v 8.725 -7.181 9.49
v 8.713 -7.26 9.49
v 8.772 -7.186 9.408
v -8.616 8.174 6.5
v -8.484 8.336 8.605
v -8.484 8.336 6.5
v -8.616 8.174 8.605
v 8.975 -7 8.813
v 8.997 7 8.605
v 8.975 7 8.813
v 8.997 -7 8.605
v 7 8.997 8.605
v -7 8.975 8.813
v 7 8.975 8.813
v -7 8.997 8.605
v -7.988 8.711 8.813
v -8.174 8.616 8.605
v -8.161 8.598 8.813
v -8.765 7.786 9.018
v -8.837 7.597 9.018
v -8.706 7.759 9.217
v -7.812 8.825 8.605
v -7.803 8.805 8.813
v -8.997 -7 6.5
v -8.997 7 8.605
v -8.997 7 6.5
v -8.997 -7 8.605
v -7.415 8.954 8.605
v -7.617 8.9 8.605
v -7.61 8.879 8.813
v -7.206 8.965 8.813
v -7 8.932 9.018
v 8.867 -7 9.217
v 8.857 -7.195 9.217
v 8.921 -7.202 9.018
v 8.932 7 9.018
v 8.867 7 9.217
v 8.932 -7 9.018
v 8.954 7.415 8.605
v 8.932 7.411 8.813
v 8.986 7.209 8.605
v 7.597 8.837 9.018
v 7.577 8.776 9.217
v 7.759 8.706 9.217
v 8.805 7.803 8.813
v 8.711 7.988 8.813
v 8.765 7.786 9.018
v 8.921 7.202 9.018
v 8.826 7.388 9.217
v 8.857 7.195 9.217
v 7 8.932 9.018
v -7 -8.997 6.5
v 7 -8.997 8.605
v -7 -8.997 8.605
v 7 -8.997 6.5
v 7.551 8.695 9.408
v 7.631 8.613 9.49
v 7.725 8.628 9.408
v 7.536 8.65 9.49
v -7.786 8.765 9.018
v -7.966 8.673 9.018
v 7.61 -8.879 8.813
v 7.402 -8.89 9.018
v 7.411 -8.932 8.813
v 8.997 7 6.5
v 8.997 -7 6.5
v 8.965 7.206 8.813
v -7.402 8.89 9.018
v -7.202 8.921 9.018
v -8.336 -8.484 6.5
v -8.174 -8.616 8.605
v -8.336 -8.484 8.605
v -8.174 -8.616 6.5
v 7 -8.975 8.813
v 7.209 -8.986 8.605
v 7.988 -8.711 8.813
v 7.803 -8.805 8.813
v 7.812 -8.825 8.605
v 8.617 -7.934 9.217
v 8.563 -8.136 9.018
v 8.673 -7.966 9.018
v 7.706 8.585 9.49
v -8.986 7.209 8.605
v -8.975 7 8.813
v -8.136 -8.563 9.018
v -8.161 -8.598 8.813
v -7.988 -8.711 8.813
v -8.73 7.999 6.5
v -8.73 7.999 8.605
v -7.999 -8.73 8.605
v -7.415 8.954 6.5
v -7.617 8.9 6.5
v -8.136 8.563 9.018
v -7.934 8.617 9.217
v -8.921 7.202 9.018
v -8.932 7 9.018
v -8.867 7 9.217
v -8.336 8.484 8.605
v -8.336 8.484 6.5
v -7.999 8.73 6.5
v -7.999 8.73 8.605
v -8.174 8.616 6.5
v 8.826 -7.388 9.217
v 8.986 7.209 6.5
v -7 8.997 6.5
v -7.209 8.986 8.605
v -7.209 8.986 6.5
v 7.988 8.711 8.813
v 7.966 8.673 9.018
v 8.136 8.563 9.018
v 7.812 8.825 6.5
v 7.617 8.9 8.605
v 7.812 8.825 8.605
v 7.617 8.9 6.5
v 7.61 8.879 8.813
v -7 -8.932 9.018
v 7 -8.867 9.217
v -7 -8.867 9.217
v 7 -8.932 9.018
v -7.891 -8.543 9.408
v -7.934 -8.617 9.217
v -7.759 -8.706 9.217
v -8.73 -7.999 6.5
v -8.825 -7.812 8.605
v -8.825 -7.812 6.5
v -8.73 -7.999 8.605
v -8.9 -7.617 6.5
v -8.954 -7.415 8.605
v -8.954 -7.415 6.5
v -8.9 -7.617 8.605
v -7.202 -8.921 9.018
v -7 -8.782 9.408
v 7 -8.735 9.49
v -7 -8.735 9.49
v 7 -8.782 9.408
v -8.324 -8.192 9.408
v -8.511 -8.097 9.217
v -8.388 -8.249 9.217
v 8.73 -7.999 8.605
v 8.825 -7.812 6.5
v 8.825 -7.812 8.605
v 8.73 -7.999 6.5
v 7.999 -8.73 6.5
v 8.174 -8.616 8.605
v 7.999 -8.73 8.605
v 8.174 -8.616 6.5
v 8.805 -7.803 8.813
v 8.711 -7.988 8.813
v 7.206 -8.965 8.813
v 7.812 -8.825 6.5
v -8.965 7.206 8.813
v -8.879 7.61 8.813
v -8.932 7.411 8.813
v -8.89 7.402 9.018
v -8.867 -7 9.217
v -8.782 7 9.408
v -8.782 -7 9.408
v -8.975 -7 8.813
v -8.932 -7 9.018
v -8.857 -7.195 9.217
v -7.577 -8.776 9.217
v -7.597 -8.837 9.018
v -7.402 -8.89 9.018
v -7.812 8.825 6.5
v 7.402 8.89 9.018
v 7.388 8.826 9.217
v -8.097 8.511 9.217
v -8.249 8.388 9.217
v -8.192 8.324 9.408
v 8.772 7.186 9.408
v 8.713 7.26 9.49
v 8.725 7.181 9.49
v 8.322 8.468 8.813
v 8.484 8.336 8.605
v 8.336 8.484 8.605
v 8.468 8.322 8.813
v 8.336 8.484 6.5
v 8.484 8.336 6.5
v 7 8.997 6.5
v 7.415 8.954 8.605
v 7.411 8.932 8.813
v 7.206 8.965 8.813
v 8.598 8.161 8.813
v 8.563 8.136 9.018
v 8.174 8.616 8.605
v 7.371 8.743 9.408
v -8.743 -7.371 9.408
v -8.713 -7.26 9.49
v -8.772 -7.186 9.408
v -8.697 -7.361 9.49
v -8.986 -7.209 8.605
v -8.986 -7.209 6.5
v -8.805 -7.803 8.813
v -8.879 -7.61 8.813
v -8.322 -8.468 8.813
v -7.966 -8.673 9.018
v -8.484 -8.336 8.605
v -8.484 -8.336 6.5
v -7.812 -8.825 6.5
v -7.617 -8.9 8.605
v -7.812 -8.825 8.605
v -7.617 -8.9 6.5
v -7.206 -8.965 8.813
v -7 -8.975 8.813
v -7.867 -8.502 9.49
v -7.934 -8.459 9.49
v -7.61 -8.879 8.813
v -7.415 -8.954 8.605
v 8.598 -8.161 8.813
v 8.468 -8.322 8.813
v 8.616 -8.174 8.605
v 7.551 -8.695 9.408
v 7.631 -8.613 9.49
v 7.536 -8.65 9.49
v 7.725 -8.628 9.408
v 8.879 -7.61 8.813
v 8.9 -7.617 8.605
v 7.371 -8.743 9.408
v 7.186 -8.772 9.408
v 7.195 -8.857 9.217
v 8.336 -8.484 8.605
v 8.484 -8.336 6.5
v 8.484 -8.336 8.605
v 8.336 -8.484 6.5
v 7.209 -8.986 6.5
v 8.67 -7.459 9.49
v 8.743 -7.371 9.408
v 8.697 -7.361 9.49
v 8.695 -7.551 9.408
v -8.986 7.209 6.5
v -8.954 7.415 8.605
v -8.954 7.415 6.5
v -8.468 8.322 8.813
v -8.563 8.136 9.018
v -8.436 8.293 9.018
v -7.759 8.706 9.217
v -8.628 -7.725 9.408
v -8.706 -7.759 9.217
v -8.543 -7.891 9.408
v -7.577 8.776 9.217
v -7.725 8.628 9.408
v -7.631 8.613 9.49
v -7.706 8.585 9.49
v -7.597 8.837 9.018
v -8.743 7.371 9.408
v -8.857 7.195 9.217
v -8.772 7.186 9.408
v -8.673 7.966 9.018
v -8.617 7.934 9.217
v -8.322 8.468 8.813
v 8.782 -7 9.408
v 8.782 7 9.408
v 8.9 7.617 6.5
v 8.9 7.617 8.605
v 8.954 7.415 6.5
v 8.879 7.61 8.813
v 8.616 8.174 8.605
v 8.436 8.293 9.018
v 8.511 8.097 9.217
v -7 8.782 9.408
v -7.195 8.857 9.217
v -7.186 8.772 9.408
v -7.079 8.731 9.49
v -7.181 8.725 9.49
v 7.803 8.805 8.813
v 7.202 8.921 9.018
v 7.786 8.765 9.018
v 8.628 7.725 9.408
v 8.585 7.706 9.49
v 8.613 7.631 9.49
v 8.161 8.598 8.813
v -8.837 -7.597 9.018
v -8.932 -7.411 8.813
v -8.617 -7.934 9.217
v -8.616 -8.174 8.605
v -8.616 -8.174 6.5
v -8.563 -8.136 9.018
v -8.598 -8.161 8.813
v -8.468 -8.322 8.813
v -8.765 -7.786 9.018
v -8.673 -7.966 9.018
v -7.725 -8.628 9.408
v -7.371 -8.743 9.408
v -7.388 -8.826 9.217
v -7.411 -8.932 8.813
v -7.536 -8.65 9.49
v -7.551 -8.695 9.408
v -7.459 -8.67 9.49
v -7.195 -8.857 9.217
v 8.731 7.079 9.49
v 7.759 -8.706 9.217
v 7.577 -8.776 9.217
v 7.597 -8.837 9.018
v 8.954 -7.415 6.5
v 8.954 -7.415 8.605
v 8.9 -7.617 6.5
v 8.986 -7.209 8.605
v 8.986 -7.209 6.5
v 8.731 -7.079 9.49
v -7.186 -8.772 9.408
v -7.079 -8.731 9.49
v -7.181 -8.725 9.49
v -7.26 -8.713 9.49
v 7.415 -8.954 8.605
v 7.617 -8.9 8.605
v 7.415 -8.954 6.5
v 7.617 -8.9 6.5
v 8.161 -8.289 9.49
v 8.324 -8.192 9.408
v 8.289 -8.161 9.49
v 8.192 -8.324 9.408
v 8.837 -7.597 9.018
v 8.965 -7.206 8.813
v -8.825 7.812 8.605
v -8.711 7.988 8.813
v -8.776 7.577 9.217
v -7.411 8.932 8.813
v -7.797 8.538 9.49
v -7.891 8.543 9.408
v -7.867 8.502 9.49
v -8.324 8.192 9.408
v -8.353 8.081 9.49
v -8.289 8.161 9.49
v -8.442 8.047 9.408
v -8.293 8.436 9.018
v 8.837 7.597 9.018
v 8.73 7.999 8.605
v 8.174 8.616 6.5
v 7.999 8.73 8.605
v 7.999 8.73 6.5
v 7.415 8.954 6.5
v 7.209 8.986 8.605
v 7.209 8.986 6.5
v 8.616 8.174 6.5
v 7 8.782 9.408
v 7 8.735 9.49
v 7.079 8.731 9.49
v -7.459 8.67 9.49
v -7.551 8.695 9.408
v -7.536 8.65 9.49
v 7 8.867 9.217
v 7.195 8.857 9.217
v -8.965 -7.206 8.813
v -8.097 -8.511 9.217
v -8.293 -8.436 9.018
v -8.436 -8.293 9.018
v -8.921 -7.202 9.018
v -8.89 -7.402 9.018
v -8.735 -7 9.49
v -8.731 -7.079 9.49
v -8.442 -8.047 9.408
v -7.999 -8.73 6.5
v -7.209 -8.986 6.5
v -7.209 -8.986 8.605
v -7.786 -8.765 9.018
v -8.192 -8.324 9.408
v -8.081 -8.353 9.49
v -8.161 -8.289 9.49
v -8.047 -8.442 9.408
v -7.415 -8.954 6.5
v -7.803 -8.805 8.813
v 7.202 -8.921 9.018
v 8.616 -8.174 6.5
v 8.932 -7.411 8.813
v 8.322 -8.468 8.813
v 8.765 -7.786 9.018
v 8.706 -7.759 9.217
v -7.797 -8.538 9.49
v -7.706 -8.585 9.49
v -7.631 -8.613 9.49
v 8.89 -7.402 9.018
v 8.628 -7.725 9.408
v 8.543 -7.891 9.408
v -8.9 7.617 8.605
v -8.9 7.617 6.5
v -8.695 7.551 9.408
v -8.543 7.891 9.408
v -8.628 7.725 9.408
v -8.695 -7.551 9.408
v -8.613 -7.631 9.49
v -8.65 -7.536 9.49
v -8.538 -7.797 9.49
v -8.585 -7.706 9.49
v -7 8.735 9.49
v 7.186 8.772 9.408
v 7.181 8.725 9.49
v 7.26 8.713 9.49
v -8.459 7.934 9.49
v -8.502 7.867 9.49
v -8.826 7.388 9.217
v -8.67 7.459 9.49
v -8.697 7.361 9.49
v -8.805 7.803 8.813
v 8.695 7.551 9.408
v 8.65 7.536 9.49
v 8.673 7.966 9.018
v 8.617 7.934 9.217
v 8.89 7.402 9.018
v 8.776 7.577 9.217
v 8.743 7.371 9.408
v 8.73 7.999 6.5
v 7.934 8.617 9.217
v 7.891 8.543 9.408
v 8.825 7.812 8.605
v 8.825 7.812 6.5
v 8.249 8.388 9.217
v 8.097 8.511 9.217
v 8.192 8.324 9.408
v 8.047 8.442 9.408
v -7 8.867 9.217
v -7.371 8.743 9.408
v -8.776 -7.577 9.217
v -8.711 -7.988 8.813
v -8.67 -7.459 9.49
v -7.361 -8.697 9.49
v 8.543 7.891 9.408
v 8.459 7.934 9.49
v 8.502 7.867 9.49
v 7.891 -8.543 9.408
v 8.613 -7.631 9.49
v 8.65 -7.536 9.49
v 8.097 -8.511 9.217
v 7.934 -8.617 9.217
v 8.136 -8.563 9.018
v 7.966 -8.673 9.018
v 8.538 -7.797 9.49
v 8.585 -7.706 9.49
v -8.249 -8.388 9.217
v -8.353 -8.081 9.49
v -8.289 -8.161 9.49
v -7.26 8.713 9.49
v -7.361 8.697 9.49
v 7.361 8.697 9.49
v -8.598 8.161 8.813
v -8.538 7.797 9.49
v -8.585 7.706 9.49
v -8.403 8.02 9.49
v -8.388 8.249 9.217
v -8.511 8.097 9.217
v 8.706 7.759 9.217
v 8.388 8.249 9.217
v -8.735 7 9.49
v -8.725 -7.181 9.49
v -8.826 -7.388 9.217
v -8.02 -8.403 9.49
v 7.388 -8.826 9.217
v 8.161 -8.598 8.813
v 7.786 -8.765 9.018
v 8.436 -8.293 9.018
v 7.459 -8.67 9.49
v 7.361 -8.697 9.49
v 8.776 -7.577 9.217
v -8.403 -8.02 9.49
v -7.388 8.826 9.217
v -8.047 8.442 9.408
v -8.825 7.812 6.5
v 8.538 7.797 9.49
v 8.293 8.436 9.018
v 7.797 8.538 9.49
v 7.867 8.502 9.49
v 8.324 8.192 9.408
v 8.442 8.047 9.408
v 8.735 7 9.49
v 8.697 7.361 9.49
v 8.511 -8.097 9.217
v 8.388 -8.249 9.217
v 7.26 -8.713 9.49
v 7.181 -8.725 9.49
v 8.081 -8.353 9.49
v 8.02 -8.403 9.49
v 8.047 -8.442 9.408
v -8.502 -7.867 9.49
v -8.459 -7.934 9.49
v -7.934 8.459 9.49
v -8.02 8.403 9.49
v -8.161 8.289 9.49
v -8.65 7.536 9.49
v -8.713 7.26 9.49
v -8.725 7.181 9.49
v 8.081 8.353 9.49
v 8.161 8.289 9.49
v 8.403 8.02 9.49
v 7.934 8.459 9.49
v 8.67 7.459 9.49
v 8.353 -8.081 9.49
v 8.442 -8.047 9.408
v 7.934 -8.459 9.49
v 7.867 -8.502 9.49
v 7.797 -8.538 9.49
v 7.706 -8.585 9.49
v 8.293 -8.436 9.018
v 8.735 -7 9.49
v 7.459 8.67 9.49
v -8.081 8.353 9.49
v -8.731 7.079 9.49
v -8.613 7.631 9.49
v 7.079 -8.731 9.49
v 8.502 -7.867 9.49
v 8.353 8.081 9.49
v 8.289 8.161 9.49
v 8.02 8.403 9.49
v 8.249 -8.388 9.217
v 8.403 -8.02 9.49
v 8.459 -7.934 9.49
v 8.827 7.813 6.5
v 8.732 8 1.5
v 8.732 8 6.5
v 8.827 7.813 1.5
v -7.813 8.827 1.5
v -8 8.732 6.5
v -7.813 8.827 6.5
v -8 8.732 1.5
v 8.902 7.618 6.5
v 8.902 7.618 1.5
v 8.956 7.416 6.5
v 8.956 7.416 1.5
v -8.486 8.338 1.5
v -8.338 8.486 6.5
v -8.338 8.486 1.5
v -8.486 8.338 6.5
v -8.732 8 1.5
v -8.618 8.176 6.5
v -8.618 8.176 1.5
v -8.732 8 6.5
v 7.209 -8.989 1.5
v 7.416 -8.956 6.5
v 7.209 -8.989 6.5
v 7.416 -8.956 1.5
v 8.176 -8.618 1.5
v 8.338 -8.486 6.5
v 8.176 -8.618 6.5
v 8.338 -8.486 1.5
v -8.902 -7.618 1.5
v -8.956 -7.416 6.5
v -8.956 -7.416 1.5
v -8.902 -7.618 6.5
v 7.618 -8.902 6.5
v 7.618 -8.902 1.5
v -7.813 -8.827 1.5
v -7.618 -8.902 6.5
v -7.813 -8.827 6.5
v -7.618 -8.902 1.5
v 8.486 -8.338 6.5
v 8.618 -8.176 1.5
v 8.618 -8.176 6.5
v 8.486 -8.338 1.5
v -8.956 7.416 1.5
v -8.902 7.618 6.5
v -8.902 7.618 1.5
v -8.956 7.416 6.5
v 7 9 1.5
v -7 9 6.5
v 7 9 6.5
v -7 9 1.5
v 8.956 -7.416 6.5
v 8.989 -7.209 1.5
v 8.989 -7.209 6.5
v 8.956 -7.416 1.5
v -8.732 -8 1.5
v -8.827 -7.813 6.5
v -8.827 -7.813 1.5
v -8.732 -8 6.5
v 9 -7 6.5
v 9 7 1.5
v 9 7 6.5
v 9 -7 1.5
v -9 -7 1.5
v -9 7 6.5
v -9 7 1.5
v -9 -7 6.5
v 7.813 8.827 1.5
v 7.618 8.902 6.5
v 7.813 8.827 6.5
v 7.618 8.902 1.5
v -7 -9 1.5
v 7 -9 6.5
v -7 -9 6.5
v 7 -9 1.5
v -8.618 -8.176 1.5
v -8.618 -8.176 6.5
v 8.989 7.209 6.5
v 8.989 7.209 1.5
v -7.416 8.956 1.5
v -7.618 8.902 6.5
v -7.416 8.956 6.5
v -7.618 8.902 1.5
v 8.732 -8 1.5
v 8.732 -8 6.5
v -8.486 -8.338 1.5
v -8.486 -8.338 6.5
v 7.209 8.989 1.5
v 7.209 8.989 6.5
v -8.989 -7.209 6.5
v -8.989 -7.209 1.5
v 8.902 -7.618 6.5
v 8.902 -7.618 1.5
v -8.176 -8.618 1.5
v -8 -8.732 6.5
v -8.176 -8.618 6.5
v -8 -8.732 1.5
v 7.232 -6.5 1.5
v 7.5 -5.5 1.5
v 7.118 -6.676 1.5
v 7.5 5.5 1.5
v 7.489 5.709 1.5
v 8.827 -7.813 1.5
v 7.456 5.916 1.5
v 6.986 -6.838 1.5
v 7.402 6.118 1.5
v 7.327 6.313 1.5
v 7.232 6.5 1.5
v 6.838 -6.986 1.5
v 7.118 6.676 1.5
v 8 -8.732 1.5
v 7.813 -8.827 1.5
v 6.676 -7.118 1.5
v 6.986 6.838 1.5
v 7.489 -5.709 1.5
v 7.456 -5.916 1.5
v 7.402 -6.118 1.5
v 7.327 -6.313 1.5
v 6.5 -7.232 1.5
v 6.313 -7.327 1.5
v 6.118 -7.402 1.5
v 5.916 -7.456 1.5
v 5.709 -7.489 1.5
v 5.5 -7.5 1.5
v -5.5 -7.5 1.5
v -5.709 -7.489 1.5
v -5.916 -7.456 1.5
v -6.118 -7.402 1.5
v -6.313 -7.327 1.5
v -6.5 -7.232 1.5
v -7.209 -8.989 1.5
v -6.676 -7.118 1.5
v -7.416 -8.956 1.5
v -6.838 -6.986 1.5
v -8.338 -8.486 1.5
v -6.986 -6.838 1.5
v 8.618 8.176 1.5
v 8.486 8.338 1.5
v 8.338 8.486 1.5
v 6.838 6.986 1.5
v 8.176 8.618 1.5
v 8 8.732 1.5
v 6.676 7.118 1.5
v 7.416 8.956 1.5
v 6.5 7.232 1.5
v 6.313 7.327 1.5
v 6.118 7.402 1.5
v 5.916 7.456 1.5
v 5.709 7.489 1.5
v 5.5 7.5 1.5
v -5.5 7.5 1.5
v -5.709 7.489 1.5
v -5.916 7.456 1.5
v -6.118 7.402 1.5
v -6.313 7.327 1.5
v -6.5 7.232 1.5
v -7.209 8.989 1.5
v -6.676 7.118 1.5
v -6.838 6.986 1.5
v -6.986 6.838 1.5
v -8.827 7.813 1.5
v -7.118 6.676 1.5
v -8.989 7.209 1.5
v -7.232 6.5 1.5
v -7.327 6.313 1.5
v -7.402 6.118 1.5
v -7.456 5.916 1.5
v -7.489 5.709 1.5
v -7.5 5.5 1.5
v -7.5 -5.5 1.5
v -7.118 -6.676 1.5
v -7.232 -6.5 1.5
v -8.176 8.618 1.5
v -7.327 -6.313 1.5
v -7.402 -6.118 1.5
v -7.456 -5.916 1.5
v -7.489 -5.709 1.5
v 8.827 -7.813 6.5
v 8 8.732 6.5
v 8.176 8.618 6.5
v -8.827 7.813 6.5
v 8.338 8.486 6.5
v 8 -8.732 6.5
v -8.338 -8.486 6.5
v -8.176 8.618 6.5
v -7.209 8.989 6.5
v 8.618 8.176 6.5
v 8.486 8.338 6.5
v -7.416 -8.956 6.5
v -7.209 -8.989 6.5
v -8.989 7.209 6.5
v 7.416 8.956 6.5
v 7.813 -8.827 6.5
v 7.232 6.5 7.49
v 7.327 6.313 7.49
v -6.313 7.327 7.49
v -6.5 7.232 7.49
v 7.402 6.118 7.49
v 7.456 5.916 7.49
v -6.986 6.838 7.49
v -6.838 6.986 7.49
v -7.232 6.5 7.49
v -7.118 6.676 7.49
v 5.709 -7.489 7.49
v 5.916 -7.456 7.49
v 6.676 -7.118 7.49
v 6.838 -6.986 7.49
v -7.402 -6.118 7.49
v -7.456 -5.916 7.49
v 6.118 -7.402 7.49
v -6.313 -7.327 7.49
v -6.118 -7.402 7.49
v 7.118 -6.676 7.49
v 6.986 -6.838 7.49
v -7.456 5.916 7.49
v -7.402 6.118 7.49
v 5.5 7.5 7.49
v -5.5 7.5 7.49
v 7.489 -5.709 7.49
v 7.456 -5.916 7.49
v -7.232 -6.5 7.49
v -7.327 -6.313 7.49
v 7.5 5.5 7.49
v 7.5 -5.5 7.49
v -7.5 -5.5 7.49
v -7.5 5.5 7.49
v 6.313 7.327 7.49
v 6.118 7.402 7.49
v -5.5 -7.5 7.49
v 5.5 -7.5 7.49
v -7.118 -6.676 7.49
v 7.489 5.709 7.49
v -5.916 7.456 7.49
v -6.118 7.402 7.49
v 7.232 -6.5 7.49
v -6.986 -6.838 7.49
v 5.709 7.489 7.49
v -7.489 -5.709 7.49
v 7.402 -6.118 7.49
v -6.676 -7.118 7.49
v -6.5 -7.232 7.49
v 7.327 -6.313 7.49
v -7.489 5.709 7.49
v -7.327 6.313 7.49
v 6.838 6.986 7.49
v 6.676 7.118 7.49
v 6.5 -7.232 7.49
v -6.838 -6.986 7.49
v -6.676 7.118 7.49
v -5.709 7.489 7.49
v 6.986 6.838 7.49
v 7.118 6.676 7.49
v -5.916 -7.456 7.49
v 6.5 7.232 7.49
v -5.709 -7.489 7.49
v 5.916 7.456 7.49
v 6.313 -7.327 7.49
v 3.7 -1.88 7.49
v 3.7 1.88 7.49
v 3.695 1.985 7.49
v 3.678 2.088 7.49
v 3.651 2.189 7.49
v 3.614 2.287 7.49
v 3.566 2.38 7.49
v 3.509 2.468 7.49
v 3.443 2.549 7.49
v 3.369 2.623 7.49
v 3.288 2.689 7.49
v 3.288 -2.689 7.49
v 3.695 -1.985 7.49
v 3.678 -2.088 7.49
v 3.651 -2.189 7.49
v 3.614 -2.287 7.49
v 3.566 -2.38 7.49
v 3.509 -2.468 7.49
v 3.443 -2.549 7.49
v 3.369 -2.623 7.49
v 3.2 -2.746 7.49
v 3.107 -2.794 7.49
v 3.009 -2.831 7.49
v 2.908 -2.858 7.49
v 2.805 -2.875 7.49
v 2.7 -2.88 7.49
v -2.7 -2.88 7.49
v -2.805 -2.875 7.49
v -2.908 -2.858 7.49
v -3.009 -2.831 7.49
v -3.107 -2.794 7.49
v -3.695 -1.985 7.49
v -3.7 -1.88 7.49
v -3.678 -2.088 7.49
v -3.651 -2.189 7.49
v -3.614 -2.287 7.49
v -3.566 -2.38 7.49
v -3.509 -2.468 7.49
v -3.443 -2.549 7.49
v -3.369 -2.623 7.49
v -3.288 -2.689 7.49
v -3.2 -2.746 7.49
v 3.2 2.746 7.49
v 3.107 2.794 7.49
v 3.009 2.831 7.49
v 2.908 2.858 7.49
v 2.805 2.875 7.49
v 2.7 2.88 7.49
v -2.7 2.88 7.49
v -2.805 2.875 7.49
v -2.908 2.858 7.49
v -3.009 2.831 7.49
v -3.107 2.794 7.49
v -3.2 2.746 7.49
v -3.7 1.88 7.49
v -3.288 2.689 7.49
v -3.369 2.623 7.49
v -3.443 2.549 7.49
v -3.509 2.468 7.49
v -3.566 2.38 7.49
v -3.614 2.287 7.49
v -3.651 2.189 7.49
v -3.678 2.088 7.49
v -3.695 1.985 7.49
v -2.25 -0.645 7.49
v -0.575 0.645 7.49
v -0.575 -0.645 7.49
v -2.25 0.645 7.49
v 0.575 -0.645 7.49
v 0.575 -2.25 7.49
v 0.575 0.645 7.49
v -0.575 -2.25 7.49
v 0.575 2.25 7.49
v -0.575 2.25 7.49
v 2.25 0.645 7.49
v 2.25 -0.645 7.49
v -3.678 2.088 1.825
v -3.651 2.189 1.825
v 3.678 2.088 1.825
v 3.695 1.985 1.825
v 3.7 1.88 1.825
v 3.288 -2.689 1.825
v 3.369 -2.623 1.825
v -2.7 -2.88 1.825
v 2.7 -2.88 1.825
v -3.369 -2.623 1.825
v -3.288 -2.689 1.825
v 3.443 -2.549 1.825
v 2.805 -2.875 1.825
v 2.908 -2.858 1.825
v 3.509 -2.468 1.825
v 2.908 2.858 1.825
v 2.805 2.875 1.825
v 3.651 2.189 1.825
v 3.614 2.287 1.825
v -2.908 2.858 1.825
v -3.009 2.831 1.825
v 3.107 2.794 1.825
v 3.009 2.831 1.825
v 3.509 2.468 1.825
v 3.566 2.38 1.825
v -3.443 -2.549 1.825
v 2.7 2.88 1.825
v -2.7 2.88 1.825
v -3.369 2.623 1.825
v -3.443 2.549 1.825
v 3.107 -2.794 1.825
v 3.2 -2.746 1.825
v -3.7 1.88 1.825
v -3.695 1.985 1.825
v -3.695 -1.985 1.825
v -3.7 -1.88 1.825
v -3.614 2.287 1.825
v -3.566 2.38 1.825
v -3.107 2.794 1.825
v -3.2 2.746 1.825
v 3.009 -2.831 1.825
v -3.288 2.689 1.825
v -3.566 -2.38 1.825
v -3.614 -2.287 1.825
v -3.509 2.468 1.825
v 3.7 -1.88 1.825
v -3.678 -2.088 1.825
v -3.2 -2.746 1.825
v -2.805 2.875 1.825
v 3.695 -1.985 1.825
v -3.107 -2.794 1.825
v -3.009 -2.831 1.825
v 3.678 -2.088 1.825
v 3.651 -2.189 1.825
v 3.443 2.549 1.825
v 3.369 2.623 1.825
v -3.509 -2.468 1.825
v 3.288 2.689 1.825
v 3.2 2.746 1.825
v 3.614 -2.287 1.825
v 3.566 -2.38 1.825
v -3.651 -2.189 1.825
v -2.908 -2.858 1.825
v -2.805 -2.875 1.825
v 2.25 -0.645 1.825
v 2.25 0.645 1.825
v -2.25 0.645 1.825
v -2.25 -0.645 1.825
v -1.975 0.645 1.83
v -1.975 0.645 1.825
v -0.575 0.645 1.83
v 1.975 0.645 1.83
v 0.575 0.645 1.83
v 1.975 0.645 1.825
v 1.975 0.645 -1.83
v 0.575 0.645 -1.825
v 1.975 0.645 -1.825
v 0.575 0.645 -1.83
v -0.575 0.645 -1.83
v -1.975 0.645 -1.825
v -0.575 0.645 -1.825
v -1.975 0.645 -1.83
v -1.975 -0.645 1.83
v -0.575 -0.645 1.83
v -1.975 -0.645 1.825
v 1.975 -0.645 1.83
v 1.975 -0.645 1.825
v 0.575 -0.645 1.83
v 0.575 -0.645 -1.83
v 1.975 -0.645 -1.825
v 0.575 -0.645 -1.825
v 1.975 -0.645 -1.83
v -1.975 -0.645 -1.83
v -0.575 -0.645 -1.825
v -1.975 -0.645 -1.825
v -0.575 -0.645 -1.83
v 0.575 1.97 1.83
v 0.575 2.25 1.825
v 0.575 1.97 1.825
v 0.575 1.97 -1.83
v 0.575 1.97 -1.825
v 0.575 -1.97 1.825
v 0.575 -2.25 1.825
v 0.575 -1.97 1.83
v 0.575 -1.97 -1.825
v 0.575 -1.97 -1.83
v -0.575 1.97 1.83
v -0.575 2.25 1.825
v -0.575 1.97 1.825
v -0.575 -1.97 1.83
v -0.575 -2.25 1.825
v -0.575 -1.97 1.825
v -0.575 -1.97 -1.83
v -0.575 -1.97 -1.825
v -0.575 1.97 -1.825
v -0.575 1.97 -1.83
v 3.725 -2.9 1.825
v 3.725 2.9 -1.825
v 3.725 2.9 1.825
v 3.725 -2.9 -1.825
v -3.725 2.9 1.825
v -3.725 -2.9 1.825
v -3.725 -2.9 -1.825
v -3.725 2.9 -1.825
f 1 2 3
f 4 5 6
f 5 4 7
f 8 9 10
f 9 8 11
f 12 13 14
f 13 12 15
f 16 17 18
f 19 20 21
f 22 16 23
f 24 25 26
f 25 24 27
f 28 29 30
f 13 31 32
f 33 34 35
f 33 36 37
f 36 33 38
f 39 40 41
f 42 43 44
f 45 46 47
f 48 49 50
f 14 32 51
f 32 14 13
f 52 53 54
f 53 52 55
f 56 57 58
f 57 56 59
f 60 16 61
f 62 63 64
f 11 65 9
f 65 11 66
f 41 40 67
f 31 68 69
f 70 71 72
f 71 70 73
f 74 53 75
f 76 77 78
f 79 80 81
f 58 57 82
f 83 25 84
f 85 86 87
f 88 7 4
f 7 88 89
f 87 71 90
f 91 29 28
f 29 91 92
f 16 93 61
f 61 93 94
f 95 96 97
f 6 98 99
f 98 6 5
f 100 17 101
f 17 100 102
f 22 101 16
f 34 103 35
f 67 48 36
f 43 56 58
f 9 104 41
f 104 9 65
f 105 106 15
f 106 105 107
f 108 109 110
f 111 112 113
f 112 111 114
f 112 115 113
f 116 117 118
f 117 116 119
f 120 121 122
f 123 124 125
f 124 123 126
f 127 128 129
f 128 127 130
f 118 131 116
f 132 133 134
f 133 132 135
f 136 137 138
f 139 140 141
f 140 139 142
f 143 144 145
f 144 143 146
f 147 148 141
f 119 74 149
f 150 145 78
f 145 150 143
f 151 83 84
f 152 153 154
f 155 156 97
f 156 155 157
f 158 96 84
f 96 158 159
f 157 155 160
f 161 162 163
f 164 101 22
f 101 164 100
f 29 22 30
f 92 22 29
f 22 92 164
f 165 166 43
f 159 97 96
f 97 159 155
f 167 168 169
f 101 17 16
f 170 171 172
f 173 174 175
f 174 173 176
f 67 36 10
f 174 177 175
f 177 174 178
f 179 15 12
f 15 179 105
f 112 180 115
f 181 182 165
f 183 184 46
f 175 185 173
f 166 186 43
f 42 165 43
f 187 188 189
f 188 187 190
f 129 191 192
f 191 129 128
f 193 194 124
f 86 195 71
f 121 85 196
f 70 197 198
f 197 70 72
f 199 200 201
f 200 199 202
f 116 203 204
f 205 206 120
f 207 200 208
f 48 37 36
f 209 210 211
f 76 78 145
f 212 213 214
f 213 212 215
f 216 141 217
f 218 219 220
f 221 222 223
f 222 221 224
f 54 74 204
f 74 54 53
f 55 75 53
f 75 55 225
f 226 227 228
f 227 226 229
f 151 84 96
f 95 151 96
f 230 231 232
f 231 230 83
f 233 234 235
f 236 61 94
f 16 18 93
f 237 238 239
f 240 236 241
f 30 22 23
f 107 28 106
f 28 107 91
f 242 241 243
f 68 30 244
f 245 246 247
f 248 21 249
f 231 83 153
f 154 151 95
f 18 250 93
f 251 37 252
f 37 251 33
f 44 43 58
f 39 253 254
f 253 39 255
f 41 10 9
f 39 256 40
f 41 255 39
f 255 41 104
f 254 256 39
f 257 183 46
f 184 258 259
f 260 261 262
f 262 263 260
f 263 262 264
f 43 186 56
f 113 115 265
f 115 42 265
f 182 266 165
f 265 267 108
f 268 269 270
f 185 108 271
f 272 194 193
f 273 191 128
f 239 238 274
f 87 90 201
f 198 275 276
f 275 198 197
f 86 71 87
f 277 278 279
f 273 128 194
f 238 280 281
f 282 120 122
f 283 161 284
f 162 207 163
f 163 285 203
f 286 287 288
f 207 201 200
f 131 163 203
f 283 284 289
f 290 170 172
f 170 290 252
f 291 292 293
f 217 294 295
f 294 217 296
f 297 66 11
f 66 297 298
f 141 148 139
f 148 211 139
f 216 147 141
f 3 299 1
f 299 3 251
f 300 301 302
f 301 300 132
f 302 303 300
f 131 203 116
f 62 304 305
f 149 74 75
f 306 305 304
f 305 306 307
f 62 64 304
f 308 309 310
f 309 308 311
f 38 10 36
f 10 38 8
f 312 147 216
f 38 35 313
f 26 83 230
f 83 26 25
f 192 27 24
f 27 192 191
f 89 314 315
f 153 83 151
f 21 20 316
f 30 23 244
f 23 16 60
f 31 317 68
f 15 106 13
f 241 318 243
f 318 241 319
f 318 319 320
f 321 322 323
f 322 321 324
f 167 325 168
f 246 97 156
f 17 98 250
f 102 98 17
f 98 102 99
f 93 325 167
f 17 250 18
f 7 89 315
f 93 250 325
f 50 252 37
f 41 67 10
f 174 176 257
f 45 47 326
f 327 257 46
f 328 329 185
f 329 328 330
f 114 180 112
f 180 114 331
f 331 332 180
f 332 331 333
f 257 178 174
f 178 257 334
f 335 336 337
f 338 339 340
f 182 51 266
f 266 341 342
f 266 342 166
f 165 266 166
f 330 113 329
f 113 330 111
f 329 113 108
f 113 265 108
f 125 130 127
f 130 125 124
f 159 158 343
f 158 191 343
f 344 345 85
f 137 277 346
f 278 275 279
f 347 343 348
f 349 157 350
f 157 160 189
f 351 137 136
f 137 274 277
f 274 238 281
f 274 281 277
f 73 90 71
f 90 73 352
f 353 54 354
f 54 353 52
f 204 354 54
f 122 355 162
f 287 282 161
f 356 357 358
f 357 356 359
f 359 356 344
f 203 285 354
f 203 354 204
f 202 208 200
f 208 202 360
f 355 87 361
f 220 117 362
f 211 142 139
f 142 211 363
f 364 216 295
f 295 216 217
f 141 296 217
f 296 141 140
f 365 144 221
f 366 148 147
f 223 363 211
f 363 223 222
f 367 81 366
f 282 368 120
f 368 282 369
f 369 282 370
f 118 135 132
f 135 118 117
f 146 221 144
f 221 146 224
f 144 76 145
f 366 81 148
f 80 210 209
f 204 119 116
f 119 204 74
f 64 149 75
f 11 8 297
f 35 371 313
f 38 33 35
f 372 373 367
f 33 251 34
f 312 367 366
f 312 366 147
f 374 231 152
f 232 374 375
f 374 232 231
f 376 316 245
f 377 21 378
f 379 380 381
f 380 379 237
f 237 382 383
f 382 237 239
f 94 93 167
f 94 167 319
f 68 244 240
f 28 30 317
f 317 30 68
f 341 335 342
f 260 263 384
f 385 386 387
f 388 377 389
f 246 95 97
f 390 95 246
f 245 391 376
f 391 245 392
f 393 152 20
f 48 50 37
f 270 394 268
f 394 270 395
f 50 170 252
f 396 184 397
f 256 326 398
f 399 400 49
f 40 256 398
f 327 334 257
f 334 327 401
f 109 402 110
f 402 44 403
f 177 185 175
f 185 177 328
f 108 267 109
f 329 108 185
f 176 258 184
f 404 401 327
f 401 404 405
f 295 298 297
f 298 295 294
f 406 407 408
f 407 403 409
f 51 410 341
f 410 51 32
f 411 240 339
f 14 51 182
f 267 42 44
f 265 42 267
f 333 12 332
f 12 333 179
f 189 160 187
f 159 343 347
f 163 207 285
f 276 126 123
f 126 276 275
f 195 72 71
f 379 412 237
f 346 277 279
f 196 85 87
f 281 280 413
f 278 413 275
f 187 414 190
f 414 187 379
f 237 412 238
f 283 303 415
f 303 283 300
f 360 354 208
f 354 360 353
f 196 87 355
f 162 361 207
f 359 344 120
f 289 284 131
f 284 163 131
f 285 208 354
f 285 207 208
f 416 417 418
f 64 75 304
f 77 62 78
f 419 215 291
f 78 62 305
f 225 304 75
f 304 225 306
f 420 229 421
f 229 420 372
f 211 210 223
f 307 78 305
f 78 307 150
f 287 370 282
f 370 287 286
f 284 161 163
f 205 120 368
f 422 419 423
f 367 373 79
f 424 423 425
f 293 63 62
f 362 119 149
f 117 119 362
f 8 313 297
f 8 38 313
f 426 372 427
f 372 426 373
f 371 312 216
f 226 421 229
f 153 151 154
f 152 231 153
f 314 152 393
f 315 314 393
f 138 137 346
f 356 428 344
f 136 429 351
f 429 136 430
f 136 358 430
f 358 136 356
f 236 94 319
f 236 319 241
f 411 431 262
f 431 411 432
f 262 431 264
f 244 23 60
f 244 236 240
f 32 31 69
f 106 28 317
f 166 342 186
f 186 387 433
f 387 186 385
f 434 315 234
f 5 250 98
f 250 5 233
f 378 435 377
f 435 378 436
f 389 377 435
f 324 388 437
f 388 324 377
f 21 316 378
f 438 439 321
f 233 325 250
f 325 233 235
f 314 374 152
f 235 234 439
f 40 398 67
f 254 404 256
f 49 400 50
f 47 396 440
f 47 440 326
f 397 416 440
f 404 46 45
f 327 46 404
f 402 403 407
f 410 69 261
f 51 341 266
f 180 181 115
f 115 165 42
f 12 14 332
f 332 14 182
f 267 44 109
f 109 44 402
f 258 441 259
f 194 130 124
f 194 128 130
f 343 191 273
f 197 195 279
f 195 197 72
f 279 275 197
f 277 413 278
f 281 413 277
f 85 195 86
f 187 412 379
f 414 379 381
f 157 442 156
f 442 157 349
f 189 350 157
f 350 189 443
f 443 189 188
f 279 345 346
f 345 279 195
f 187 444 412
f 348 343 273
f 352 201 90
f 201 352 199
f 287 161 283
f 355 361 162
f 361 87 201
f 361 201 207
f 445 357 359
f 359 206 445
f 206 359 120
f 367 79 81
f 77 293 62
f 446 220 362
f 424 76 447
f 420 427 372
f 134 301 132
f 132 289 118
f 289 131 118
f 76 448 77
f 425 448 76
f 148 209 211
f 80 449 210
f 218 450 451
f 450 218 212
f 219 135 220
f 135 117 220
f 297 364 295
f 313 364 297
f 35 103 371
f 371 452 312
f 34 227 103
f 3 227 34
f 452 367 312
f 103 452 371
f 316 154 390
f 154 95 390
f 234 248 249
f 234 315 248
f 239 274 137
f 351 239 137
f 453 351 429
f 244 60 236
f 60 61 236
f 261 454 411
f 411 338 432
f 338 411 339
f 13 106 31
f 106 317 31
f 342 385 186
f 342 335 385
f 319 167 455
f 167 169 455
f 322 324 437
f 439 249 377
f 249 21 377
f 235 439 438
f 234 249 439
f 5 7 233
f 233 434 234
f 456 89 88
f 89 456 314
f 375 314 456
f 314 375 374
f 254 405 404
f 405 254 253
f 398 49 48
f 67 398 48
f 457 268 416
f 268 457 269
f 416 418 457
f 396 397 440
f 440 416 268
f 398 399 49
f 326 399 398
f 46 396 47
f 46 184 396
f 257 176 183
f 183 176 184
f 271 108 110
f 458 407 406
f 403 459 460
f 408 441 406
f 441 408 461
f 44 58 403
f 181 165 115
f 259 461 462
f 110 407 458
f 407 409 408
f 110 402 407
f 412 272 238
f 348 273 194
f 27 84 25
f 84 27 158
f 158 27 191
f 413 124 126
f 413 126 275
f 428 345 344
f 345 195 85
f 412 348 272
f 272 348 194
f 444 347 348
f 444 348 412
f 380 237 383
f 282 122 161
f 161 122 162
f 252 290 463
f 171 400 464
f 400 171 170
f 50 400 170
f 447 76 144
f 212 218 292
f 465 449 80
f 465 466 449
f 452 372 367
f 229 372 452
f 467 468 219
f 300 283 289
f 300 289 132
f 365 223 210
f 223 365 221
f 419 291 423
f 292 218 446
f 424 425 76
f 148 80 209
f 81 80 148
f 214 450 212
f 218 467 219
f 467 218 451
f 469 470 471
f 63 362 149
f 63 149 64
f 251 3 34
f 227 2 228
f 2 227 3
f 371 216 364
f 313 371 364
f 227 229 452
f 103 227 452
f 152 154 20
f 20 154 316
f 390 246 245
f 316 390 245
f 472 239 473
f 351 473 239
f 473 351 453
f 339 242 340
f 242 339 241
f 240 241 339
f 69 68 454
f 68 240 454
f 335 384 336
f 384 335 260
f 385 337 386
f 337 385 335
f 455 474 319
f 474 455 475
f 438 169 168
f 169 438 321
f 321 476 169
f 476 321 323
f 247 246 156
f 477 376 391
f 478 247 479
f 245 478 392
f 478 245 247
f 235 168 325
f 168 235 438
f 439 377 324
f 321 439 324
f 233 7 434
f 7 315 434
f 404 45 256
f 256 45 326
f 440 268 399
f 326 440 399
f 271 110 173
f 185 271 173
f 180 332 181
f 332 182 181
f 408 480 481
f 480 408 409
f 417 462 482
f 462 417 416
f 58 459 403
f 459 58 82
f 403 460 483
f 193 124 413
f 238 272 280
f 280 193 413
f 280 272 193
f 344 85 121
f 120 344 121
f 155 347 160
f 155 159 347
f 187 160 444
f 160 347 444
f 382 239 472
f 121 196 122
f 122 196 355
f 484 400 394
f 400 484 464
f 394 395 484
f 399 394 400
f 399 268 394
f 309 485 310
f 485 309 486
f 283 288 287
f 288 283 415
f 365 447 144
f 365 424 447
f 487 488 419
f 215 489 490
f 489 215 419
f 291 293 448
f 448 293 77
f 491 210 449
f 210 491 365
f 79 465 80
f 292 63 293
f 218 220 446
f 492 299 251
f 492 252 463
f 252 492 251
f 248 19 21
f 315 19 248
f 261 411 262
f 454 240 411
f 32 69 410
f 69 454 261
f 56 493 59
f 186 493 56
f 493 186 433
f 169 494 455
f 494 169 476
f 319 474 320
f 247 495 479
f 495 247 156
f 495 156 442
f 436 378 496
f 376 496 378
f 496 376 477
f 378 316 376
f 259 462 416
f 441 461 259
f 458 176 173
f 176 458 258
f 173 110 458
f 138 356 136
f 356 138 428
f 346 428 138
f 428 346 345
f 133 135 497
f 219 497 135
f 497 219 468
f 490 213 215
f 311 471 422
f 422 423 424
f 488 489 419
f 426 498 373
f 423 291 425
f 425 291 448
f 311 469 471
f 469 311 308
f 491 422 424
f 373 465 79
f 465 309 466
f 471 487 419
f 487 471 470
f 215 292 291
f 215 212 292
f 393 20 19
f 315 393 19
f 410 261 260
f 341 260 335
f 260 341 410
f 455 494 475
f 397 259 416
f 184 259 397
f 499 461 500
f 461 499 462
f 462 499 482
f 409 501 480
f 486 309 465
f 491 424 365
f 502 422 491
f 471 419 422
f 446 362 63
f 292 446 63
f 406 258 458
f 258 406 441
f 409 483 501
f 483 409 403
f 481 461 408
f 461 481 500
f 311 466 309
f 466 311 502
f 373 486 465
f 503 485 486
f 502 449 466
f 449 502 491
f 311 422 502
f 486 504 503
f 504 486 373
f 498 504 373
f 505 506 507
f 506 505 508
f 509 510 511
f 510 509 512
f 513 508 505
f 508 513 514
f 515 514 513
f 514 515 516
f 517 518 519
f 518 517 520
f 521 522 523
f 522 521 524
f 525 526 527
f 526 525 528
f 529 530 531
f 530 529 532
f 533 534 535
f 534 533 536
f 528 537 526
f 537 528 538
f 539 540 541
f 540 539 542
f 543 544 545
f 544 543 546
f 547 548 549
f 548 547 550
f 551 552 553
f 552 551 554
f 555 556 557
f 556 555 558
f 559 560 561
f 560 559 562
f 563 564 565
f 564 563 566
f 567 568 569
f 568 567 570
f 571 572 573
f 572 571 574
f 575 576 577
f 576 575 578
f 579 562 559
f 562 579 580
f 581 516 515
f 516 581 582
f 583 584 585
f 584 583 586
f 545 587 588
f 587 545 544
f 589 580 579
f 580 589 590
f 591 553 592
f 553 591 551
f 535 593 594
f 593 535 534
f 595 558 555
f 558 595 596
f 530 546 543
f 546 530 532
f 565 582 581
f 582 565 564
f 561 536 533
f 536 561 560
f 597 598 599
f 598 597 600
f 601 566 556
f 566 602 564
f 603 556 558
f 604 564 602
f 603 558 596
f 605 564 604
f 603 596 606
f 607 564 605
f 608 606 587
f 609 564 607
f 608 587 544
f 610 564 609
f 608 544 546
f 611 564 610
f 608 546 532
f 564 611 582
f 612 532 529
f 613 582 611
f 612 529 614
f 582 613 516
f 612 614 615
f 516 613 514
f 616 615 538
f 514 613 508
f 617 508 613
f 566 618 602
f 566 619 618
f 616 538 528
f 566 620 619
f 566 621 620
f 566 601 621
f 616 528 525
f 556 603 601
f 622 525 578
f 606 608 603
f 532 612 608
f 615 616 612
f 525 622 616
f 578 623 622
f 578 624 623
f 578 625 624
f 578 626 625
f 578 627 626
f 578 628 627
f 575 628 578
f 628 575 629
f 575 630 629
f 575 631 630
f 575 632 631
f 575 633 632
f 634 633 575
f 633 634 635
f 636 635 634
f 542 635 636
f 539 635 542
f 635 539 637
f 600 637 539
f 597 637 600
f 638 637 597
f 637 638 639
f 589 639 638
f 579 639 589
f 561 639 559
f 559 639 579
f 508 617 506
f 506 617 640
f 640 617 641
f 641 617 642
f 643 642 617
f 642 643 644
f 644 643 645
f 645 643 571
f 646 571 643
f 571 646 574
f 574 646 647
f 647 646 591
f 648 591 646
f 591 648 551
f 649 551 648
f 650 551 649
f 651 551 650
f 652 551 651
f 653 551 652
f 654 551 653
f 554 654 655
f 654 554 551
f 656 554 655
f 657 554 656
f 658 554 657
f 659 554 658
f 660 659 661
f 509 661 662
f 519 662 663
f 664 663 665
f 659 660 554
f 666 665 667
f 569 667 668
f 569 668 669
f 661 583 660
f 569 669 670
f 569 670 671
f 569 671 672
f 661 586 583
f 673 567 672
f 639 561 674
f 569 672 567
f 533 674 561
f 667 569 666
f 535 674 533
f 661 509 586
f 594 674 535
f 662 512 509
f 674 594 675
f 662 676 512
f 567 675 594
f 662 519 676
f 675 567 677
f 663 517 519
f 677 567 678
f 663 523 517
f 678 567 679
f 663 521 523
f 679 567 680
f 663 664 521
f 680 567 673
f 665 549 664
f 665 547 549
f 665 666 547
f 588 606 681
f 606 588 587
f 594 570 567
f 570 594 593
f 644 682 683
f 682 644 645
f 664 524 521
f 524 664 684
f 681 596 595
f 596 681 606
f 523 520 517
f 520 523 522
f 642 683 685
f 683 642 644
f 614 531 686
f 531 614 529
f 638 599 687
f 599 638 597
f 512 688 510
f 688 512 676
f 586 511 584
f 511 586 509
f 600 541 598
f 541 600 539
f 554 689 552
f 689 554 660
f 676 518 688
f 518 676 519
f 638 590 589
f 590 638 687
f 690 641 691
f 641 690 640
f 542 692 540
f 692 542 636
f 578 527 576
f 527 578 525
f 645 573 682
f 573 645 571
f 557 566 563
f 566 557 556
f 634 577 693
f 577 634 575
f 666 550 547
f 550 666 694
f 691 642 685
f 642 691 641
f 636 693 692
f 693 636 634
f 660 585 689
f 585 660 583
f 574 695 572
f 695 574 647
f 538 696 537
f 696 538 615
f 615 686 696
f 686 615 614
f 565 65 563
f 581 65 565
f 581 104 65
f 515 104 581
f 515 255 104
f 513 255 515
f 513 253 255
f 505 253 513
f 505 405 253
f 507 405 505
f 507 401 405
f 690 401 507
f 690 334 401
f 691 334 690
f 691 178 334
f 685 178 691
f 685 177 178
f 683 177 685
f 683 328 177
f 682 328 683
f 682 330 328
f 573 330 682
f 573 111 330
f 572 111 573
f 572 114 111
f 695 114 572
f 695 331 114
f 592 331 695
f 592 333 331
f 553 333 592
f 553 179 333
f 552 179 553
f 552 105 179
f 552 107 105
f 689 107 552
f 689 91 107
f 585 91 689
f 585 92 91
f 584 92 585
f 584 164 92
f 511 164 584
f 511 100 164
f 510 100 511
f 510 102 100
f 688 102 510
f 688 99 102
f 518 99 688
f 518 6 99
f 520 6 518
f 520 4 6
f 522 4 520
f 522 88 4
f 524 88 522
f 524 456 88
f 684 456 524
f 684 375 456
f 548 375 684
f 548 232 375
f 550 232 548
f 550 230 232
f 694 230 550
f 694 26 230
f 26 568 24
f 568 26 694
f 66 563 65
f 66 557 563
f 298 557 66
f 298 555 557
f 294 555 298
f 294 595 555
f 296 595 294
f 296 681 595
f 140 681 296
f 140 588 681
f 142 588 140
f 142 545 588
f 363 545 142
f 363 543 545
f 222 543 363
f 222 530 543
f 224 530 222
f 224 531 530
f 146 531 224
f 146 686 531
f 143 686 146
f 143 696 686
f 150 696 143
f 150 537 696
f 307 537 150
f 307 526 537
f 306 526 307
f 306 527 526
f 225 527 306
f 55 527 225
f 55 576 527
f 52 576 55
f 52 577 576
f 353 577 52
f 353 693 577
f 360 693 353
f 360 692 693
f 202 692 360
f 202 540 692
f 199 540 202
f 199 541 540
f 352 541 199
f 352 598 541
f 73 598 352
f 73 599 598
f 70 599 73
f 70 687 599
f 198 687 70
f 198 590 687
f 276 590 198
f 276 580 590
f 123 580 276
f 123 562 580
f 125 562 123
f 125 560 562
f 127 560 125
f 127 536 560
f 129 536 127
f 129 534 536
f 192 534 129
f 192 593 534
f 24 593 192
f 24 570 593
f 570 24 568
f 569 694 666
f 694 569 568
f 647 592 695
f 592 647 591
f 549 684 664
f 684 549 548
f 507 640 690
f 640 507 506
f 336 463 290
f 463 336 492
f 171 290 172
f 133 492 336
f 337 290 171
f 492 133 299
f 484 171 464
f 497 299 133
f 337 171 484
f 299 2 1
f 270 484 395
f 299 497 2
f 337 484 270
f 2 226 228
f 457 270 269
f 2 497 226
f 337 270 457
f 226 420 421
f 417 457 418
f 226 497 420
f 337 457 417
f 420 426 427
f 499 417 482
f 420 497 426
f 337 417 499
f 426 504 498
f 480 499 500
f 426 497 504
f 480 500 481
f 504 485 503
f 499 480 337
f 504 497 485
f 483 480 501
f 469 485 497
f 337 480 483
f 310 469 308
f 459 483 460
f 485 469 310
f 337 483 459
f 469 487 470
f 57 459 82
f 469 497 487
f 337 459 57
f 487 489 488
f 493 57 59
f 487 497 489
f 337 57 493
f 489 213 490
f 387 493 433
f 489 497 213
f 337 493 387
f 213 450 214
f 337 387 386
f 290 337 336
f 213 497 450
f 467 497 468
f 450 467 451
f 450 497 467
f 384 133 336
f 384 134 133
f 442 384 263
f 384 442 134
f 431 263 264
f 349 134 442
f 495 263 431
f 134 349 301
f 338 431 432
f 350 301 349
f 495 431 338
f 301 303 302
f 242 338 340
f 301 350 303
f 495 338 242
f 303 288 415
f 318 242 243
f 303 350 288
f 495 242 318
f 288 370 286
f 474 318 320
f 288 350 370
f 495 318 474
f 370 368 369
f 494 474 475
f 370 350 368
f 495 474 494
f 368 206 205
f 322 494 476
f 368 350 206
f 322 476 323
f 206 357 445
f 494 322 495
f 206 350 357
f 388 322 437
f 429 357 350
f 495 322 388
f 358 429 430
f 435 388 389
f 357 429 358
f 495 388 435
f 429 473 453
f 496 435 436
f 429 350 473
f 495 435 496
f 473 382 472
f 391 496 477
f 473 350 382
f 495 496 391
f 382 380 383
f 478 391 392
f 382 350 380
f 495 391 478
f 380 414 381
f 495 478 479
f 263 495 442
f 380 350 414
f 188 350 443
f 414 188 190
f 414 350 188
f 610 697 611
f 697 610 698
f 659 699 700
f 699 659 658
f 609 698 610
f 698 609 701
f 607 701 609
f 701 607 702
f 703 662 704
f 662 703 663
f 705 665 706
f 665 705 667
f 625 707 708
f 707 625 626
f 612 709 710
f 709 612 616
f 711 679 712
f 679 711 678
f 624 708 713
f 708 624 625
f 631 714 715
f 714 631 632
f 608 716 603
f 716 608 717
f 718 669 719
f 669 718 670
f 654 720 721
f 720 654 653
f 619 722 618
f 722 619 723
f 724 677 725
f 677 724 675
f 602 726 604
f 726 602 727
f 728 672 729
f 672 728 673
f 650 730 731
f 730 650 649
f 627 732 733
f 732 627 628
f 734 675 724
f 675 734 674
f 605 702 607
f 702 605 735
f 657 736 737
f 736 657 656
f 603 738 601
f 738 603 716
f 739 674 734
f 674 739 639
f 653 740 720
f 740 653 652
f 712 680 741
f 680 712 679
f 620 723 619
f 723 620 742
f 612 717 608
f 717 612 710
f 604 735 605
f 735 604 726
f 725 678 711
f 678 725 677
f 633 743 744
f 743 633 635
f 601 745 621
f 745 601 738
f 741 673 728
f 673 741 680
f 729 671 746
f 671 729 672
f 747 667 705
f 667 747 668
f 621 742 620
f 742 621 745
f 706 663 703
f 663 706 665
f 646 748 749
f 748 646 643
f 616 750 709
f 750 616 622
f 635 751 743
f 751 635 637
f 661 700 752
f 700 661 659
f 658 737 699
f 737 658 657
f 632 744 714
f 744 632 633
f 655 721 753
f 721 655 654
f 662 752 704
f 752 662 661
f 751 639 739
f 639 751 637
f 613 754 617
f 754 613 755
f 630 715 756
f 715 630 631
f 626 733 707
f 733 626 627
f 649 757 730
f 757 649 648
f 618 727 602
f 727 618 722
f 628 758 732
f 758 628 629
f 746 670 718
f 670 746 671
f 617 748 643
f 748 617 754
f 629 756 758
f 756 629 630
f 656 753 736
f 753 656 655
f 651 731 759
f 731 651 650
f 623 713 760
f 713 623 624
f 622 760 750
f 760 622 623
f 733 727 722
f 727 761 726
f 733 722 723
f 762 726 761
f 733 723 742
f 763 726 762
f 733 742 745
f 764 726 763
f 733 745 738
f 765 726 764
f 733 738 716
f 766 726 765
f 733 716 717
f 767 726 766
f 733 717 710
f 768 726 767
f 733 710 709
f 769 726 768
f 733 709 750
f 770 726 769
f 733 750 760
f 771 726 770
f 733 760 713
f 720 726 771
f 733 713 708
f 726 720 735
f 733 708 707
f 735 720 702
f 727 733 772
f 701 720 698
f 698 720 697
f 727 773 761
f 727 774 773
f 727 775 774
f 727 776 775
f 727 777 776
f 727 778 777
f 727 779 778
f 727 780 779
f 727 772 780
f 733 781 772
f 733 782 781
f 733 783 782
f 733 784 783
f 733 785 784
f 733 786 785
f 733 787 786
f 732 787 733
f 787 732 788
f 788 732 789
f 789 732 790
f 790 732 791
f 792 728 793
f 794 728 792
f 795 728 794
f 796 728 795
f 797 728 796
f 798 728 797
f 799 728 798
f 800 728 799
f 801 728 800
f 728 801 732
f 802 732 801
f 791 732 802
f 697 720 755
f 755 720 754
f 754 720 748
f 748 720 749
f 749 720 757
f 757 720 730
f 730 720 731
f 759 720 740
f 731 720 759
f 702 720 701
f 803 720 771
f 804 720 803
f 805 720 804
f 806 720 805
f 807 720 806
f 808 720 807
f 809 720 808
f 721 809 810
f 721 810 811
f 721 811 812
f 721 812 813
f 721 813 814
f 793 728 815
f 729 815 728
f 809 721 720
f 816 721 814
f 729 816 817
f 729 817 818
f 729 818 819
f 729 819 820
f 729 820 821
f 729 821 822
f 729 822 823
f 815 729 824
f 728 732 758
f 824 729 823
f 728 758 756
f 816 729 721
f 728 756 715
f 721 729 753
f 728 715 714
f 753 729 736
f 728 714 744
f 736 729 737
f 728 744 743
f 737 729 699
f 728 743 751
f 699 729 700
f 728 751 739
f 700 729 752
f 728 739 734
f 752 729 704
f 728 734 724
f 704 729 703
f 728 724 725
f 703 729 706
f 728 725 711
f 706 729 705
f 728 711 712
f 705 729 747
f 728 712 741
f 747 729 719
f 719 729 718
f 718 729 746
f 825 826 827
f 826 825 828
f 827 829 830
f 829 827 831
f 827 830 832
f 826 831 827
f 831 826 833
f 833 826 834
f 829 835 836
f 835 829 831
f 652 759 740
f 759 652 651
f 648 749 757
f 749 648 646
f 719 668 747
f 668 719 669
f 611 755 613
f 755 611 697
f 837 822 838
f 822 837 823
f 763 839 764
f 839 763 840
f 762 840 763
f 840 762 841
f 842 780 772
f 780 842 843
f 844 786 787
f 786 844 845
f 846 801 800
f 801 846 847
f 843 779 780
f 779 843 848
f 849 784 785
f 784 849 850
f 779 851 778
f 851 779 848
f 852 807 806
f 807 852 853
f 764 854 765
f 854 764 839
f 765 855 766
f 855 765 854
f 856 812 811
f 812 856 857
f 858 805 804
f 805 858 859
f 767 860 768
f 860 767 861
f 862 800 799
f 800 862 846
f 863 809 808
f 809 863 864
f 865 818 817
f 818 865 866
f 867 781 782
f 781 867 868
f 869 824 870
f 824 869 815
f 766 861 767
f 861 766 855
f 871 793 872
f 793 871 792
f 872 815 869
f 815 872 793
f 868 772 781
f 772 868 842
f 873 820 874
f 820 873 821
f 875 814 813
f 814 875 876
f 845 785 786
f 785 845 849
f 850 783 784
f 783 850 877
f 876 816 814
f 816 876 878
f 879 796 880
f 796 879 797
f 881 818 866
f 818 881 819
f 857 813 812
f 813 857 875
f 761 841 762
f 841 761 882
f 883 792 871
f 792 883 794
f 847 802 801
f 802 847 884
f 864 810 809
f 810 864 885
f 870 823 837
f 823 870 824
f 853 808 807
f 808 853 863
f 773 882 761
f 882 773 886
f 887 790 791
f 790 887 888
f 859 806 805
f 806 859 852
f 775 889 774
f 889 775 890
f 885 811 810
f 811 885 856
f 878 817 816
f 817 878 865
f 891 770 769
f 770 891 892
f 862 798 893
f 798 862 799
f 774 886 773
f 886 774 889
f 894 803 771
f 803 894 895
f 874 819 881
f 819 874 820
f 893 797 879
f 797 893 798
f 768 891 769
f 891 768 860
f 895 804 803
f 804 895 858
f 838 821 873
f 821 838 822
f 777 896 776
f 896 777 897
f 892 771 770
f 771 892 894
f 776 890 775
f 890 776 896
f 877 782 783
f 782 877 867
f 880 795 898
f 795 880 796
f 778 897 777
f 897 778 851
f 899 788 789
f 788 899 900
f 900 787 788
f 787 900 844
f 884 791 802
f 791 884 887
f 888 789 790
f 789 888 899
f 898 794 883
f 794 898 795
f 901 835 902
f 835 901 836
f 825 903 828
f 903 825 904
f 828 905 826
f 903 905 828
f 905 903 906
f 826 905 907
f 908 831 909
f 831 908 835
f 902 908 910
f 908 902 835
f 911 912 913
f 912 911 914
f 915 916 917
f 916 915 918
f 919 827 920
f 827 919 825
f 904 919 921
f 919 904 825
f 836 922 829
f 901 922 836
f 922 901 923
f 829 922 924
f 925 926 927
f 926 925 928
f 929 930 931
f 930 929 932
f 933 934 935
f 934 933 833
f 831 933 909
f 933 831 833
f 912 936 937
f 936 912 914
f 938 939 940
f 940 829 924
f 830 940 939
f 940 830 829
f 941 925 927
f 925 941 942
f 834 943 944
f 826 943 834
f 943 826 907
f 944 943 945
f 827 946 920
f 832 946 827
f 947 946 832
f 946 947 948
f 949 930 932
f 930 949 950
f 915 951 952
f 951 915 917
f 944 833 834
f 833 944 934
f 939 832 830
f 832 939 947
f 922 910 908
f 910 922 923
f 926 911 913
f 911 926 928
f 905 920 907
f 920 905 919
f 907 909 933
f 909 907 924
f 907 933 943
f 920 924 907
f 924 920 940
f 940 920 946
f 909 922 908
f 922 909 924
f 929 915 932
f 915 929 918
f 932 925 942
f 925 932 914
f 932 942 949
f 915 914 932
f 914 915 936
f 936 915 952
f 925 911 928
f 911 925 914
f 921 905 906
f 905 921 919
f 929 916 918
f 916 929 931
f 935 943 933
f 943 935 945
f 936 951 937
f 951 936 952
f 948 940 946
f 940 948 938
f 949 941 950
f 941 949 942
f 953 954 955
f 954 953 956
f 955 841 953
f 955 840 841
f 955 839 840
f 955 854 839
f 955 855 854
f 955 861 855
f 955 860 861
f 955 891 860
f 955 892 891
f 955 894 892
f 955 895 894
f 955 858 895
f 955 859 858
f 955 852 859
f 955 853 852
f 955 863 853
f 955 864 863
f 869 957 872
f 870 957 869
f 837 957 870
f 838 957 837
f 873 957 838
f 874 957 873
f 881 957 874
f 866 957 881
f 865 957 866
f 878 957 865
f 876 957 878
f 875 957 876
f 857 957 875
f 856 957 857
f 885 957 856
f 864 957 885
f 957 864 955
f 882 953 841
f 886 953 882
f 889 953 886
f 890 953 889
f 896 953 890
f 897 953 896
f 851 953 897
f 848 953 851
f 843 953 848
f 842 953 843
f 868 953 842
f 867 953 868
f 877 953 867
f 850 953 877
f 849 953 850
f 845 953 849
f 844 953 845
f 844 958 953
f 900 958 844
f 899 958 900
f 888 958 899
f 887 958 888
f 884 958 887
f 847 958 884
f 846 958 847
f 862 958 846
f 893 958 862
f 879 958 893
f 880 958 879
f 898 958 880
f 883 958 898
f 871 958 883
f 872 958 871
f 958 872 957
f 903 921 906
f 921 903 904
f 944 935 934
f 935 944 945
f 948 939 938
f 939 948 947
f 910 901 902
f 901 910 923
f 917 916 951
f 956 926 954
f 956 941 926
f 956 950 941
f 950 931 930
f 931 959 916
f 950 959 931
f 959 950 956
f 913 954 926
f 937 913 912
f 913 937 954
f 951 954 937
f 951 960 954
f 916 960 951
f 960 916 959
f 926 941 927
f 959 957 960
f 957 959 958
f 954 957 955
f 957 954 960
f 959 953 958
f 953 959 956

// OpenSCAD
// Define higher resolution for transformations
$fn=60;

difference() {
union(){
    // keycap outside cupola
    difference() {
        union() {
            // rounded cap - top half
            translate([0,0, 7.5]) // half mil under ten
            roundedcube(18, 6, 2);

            // rounded sides - bottom half
            translate([0,0,1.5])
            sideroundedcube(18, 5, 2);
        };

        // top flattening
        translate([0,0,9.49])
        sideroundedcube(18, 6, 2);

        // internal cupola cutoff
        translate([0,0,1.49])
        sideroundedcube(15, 6, 2);
    }

    // fitting support
    translate([0, 0, 4.75])
    difference(){
        // housing fitting
        hull() {
            translate([2.70, 1.88, 0])   cylinder(6.5, 1, 1, true);
            translate([-2.70, 1.88, 0])  cylinder(6.5, 1, 1, true);
            translate([2.70, -1.88, 0])  cylinder(6.5, 1, 1, true);
            translate([-2.70, -1.88, 0]) cylinder(6.5, 1, 1, true);
        }
        // cross fitting cutoff
        cube([4.5, 1.29, 10], true);
        cube([1.15, 4.5, 10], true);
    }
}
// enable to see sliced
*translate([0, 5, 5]) cube([20, 10, 20], true);
}


// reference inner cupola cutoff
*translate([10,10,1.49])
sideroundedcube(16, 6, 2);

// height reference, with z offset for switch spacing
*translate([0,0,1.5])
cube([18, 18, 8]); // height = 8mm


/**
 * Reference fitting cross
 * The fitting cross on the kailh speed has been measured to be:
 * - horizontal : 1.27 to 1.29 thick, 3.95 in length, and 3.65 in height
 * - vertical   : 1.11 to 1.15 think, 3.95 in length, and 3.65 in height
 */
#union(){
    cube([3.95, 1.29, 3.66], true); // h
    cube([1.15, 3.94, 3.66], true); // v
 }

/**
 * Reference piston housing
 * The piston housing on the kailh speed has been measured to be:
 * - x : 7.47
 * - y : 5.81
 * - z : 3.65
 */
#cube([7.45, 5.8, 3.65], true);


module roundedcube(s, h, r) {
    minkowski() {
        cube([s-r*2, s-r*2, h-r*2], true);
        sphere(r);
    };
}

module sideroundedcube(s, h, r) {
    linear_extrude(height=h)
    minkowski() {
        square(s-r*2, true);
        circle(r);
    };
}
